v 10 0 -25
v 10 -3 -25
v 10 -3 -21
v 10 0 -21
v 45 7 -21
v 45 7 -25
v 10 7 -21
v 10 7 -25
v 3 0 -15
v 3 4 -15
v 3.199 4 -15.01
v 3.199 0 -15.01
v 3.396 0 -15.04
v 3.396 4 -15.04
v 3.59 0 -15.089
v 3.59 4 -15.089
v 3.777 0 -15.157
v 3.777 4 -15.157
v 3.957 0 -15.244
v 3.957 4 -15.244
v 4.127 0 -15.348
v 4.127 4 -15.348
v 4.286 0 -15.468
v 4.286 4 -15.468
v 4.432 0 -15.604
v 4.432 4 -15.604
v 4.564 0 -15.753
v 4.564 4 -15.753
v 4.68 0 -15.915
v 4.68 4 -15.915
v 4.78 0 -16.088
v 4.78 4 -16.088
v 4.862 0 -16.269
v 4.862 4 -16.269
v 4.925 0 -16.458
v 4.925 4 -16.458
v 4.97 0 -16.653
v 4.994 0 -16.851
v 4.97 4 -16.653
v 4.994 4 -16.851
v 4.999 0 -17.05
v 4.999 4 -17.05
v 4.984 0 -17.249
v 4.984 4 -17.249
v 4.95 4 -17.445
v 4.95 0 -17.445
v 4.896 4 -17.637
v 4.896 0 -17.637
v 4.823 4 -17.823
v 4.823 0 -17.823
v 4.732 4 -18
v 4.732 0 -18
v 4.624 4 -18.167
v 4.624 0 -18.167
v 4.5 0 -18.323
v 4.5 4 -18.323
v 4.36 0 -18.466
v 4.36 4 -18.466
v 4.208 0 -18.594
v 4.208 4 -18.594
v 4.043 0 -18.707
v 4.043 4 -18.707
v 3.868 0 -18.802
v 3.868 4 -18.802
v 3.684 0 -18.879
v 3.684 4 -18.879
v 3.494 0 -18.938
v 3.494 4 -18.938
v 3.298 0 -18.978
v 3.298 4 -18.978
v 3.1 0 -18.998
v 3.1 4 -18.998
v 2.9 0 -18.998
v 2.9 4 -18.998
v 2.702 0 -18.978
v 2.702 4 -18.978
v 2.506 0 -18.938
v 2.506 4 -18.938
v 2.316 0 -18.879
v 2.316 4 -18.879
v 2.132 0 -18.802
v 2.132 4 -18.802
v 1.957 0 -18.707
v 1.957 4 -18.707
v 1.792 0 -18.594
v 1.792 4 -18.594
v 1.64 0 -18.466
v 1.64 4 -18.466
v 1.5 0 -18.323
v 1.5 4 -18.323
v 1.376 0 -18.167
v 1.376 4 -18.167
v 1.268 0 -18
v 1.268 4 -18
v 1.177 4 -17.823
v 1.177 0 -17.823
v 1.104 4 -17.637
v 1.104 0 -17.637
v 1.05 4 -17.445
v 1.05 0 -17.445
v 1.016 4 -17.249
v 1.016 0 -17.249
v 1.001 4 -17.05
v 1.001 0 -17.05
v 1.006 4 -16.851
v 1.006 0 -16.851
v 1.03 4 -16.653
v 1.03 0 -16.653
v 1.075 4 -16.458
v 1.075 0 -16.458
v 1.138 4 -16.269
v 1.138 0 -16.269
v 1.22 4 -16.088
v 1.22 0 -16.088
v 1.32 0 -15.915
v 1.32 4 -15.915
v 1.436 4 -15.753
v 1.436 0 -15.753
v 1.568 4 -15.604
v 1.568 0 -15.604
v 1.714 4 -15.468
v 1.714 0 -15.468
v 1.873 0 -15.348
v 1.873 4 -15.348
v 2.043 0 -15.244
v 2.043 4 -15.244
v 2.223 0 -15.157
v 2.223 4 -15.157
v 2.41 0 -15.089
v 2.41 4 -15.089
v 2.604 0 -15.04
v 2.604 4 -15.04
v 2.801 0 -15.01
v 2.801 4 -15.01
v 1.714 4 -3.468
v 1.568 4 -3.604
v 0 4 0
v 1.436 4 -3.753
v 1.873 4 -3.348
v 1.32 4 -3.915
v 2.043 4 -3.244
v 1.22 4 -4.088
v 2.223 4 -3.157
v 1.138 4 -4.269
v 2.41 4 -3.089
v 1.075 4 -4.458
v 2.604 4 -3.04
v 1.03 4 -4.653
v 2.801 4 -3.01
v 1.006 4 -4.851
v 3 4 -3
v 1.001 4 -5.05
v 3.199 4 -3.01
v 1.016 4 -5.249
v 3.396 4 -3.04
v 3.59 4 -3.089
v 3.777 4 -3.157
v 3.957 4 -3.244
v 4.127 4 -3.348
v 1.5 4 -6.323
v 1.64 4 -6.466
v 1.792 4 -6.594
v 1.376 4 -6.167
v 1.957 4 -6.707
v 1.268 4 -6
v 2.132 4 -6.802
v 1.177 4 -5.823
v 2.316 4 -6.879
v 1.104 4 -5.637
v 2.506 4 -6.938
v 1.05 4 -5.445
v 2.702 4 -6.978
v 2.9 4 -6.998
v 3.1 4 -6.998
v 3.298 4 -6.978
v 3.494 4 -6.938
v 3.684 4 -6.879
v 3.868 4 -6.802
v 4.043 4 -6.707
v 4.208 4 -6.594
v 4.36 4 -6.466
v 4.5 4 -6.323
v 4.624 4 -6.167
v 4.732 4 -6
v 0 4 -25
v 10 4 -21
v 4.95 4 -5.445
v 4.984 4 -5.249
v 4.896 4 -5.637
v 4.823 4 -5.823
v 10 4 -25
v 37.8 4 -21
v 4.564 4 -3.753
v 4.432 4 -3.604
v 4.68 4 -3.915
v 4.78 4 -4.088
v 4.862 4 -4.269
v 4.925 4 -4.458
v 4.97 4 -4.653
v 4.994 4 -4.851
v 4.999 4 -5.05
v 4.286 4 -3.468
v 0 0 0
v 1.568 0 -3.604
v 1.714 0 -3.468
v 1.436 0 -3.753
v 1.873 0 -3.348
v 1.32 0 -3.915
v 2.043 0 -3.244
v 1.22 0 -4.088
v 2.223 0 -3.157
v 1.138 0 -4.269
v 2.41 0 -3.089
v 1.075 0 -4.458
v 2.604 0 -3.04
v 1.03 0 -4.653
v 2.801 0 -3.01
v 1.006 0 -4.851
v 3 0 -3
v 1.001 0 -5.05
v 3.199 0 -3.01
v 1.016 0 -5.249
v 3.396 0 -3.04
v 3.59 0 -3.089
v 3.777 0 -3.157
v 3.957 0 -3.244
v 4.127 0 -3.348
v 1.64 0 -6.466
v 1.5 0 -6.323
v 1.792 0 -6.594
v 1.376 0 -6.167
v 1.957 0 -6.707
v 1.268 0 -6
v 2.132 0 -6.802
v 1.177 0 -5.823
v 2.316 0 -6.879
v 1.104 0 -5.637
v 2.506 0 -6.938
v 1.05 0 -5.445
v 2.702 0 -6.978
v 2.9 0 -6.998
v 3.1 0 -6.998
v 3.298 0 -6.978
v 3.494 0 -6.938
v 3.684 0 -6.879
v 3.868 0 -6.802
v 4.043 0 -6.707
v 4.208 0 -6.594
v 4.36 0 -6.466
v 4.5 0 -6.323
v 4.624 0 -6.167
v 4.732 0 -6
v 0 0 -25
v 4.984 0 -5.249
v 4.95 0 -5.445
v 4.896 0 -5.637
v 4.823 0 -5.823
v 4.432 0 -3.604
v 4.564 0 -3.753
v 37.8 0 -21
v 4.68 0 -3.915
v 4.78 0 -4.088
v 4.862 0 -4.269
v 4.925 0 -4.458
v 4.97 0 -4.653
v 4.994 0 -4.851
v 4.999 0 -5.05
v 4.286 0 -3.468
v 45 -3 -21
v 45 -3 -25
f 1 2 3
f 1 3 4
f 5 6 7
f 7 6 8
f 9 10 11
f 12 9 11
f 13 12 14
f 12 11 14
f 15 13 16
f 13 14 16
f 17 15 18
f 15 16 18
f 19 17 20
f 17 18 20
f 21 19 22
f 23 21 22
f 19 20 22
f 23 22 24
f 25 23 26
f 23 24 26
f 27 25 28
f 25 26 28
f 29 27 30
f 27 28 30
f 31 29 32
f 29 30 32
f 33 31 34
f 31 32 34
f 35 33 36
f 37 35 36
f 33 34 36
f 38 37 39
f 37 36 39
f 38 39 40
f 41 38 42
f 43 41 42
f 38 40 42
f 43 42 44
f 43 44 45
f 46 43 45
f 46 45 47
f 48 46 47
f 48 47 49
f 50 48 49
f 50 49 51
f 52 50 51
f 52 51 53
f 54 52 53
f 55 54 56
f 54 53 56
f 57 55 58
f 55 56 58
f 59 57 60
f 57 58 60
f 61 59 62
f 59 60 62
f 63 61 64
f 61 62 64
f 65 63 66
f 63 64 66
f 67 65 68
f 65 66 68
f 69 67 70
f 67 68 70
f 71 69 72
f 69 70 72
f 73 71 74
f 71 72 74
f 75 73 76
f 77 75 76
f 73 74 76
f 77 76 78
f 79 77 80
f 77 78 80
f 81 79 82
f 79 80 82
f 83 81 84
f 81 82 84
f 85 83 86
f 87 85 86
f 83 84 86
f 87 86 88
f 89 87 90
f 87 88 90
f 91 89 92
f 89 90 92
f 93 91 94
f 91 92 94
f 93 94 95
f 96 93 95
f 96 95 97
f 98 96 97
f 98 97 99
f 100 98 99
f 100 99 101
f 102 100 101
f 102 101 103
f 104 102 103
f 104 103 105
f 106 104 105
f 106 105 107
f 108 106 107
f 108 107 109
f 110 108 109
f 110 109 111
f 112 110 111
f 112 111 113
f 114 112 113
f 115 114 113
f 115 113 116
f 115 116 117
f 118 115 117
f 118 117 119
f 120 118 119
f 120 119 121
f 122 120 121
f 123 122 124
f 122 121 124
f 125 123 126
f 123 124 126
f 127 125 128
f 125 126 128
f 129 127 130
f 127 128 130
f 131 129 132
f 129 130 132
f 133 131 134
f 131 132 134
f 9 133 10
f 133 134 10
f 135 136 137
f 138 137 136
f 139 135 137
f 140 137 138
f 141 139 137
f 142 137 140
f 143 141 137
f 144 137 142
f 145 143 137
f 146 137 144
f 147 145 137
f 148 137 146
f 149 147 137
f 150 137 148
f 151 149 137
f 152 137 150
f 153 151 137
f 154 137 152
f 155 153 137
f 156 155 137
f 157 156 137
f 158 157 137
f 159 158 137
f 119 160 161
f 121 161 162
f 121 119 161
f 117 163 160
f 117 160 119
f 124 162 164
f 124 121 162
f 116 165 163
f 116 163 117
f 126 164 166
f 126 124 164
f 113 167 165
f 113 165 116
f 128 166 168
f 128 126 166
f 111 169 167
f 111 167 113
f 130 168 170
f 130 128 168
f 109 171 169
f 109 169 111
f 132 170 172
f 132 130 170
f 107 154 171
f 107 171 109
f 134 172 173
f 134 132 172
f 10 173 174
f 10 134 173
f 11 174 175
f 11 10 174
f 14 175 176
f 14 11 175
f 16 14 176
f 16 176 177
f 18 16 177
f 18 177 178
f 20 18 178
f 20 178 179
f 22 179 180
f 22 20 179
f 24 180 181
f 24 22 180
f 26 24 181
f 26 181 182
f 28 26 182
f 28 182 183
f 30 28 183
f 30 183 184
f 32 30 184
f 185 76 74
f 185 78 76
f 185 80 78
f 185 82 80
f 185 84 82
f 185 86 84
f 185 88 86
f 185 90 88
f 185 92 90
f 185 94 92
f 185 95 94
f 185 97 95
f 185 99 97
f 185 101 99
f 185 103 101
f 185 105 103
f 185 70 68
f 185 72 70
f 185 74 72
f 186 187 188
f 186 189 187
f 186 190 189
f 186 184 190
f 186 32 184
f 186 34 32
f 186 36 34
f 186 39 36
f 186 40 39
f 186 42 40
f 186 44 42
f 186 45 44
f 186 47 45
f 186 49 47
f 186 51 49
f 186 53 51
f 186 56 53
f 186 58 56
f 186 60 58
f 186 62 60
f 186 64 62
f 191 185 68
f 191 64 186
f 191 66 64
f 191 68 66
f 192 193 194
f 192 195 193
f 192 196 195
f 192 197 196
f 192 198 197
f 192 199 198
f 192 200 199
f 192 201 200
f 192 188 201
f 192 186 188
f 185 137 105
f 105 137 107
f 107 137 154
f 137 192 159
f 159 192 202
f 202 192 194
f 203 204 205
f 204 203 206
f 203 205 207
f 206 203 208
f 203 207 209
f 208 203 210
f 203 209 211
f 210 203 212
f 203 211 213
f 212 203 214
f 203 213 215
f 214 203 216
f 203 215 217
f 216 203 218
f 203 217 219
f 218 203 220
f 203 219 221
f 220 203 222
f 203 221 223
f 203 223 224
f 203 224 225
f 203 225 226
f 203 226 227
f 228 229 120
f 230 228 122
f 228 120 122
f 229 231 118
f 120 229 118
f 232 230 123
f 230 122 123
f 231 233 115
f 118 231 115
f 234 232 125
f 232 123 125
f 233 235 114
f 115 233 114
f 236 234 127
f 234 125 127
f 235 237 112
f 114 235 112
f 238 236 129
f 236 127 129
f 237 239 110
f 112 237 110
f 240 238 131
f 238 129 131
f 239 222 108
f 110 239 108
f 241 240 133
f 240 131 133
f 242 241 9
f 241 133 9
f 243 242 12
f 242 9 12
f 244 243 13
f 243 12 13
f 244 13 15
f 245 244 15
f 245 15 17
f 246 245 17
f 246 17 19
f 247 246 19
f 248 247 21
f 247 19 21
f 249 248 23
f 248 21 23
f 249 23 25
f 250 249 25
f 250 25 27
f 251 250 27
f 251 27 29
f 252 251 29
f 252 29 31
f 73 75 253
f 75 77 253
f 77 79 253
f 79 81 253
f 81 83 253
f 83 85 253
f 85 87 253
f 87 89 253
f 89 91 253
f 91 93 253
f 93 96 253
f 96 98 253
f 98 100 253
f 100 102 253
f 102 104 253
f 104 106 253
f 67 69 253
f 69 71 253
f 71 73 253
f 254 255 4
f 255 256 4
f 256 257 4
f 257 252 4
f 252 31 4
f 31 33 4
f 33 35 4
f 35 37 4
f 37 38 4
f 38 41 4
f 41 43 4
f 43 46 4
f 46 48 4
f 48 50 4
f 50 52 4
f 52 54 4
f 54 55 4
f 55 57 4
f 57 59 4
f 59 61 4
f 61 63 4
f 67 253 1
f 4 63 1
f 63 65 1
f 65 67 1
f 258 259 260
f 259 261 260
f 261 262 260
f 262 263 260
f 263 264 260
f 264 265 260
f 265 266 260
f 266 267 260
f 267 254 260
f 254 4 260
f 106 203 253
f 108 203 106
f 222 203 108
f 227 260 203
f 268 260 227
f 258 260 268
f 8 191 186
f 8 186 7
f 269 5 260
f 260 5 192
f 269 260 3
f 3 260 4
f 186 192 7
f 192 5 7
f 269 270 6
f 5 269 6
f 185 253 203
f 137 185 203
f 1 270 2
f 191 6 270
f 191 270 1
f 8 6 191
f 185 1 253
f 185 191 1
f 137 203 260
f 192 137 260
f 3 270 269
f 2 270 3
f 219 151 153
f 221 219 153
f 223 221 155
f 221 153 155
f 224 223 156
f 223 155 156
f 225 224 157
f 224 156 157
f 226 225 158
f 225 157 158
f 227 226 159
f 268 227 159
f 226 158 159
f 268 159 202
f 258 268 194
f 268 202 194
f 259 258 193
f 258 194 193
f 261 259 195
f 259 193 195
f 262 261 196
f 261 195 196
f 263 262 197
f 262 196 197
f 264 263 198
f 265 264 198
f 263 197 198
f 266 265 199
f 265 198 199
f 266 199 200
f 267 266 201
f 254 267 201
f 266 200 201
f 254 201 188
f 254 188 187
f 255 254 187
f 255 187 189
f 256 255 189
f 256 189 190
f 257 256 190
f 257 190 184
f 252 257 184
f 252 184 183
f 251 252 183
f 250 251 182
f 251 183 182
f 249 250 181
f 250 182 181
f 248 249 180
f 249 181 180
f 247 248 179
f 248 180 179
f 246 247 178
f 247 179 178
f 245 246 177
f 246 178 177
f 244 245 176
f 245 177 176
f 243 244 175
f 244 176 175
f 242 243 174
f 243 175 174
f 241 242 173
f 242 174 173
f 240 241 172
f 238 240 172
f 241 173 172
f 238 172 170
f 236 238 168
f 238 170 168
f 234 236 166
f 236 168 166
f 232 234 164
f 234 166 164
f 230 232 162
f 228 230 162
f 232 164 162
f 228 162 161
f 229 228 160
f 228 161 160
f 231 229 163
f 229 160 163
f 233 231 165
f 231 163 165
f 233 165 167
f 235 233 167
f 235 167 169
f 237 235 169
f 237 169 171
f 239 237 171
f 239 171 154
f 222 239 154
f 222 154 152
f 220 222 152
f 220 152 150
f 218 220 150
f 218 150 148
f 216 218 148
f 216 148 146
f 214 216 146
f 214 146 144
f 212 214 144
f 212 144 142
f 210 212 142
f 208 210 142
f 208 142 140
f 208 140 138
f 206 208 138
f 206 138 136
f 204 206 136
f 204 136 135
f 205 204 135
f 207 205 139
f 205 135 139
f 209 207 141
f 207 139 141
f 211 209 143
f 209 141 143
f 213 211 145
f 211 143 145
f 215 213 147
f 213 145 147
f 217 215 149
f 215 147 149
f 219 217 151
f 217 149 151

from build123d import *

# Parameters (mm, degrees)
BOSS_EXTRU_1_DEPTH      = 4
ESQUISSE2_R             = 2
ENL_V_MAT_EXTRU_1_DEPTH = 4
ESQUISSE4_W             = 35
ESQUISSE4_H             = 10
BOSS_EXTRU_2_DEPTH      = 4


with BuildPart() as part:
    # Esquisse1 → Boss.-Extru.1 (new body)
    with BuildSketch(Plane(origin=(0, 0, 0), x_dir=(1, 0, 0), z_dir=(0, 1, 0))):
        Polygon((0, 0), (45, 25), (0, 25), align=None)
    extrude(amount=BOSS_EXTRU_1_DEPTH)

    # Esquisse2 → Enlèv. mat.-Extru.1 (cut)
    with BuildSketch(Plane(origin=(0, 4, 0), x_dir=(1, 0, 0), z_dir=(0, 1, 0))):
        with Locations(Location((3, 17, 0), (0, 0, 270))):
            Circle(ESQUISSE2_R)
        with Locations(Location((3, 5, 0), (0, 0, 270))):
            Circle(ESQUISSE2_R)
    extrude(amount=-ENL_V_MAT_EXTRU_1_DEPTH, mode=Mode.SUBTRACT)

    # Esquisse4 → Boss.-Extru.2 (add)
    with BuildSketch(Plane(origin=(0, 0, -25), x_dir=(-1, 0, 0), z_dir=(0, 0, -1))):
        with Locations((-27.5, 2)):
            Rectangle(ESQUISSE4_W, ESQUISSE4_H)
    extrude(amount=-BOSS_EXTRU_2_DEPTH)


solid = part.part
